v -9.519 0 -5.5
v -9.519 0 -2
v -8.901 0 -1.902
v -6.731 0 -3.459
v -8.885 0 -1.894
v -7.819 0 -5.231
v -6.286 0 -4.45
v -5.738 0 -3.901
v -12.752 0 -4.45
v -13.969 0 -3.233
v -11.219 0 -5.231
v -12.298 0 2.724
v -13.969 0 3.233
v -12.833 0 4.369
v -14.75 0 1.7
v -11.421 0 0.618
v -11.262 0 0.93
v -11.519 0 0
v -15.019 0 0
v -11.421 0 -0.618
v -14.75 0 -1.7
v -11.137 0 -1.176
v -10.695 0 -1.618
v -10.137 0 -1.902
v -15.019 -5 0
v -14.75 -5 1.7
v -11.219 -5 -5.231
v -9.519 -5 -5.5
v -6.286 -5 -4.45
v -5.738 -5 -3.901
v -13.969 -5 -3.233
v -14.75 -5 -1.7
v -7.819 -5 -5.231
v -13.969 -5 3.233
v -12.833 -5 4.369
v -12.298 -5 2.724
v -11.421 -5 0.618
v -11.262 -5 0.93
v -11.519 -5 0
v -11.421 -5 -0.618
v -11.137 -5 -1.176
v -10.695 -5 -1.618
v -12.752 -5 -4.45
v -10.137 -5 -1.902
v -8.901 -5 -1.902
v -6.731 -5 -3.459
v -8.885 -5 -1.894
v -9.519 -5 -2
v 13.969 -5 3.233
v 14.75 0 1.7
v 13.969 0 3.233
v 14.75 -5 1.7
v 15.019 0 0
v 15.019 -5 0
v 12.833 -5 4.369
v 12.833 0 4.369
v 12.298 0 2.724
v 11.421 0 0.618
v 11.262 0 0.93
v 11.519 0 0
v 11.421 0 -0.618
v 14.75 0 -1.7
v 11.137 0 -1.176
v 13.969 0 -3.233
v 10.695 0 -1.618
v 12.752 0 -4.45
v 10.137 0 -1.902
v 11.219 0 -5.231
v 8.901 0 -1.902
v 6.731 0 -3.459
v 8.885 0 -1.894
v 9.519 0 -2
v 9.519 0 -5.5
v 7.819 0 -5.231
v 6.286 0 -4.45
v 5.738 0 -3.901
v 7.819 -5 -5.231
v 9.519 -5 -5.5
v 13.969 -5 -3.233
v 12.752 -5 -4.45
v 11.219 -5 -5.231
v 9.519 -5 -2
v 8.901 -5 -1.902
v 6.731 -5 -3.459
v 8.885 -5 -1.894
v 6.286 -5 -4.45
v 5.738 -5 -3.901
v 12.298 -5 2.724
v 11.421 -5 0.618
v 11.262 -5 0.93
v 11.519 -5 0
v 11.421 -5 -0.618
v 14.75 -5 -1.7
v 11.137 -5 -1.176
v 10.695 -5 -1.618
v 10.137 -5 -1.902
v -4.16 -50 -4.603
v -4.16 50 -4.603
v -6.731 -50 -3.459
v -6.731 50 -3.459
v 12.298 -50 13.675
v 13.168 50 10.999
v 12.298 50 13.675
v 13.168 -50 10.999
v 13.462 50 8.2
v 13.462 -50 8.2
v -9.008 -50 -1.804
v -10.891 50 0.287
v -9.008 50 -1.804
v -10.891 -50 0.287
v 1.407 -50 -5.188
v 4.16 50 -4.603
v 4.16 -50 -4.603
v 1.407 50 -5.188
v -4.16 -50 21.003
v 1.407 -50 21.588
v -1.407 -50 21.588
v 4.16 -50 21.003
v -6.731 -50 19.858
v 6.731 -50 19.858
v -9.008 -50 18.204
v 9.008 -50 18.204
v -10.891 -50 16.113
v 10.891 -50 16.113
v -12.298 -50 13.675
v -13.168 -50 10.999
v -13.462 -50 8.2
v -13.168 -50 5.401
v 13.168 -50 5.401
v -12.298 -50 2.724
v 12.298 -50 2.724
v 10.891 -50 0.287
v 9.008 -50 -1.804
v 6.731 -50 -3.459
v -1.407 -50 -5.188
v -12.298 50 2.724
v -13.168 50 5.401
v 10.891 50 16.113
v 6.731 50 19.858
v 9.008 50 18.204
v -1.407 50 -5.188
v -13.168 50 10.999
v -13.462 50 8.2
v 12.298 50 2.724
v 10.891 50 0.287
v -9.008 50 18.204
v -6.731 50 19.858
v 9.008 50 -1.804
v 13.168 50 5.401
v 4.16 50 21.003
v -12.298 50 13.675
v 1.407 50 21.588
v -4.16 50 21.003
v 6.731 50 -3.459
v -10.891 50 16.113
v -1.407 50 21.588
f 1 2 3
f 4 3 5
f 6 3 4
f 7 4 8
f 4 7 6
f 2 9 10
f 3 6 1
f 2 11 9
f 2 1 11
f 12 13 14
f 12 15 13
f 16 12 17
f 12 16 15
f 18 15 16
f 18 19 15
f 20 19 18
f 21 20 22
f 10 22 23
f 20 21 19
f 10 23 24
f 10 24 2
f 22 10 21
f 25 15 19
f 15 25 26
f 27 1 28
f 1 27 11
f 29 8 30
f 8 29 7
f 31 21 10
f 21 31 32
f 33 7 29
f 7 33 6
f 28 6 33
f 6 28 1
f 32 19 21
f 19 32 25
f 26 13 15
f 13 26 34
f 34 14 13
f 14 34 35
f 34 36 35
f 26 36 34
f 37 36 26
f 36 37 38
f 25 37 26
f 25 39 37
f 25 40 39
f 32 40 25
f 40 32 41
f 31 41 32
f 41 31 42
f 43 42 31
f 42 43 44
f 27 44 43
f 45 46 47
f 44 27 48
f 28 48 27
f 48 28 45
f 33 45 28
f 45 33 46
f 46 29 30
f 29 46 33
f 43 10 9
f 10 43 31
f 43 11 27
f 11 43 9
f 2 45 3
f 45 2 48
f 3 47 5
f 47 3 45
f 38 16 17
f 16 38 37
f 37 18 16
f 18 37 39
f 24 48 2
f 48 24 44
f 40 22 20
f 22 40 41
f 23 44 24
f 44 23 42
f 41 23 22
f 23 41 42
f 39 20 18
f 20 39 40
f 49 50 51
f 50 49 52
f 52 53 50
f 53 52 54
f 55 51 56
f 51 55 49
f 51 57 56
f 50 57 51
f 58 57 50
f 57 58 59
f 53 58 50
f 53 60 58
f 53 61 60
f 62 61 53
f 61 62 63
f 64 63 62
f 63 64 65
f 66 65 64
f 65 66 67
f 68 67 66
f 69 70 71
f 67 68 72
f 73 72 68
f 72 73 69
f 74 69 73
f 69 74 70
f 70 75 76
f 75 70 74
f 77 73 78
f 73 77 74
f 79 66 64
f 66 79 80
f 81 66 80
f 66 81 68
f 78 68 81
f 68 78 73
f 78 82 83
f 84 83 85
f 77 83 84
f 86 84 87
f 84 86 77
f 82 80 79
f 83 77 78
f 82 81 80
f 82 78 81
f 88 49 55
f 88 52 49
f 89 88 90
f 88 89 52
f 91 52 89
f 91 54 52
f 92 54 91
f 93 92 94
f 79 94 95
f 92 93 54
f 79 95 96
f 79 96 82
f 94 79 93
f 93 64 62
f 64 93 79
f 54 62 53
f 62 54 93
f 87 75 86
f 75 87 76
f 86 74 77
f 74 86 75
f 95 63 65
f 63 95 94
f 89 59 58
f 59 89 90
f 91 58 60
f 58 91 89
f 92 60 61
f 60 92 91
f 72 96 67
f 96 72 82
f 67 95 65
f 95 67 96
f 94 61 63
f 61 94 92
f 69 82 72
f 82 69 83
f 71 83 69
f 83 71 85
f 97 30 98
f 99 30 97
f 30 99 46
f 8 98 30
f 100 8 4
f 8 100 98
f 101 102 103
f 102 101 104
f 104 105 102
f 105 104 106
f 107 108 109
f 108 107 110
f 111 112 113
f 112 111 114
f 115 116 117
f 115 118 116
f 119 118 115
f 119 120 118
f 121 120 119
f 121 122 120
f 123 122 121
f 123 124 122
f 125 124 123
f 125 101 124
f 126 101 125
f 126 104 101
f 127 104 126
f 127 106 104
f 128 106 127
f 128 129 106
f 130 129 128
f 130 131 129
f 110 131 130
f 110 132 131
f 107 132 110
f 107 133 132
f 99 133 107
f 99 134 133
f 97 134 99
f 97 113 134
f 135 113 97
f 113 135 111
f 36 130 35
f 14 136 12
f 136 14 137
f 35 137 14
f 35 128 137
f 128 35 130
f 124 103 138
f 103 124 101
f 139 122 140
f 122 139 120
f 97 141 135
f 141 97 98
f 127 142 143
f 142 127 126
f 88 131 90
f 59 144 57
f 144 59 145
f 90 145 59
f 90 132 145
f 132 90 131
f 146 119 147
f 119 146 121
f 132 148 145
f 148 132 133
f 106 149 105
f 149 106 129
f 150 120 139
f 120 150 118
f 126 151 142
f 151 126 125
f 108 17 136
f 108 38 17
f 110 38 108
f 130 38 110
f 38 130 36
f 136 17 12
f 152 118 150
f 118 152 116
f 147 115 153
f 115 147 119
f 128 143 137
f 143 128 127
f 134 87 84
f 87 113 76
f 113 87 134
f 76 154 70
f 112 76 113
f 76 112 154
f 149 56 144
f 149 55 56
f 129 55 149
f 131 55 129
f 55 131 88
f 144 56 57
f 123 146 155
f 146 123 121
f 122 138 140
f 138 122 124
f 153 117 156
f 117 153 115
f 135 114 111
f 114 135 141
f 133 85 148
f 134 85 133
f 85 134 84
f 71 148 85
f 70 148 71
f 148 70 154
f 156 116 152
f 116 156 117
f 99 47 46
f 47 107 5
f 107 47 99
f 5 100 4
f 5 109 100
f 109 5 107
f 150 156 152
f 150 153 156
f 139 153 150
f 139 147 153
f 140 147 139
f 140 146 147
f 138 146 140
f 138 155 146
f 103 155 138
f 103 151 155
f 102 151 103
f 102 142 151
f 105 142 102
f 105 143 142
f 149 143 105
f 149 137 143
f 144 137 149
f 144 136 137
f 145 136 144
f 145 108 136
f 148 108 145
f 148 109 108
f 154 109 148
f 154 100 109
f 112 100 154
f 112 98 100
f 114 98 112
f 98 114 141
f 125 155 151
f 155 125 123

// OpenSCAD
// Units are in millimeters
bearing_od = 11;
bearing_id = 4;
bearing_height = 5;
bearing_clearance = 0.1;
bearing_bolt_clearance = 0.1;

work_diameter = 1.06 * 25.4; // 1.06 inches to MM

bearing_distance = sqrt(pow(work_diameter/2, 2) + pow(work_diameter/2, 2));
work_offset = sqrt(pow(work_diameter/2 + bearing_od/2,2) - pow(bearing_distance/2,2));


module bearing() {
  rotate([90,0,0])
  translate([0,0,0])
  difference() {
    cylinder(r=bearing_od/2, h=bearing_height, $fn=20);

    translate([0,0,-0.1])
    cylinder(r=bearing_id/2, h=bearing_height + 0.2, $fn=20);
  }
  
}


translate([-bearing_distance/2,0,0])
bearing();

translate([bearing_distance/2,0,0])
bearing();

translate([0,0,work_offset/2])
rotate([90,0,0])
cylinder(r=work_diameter/2, h=100, center=true);
